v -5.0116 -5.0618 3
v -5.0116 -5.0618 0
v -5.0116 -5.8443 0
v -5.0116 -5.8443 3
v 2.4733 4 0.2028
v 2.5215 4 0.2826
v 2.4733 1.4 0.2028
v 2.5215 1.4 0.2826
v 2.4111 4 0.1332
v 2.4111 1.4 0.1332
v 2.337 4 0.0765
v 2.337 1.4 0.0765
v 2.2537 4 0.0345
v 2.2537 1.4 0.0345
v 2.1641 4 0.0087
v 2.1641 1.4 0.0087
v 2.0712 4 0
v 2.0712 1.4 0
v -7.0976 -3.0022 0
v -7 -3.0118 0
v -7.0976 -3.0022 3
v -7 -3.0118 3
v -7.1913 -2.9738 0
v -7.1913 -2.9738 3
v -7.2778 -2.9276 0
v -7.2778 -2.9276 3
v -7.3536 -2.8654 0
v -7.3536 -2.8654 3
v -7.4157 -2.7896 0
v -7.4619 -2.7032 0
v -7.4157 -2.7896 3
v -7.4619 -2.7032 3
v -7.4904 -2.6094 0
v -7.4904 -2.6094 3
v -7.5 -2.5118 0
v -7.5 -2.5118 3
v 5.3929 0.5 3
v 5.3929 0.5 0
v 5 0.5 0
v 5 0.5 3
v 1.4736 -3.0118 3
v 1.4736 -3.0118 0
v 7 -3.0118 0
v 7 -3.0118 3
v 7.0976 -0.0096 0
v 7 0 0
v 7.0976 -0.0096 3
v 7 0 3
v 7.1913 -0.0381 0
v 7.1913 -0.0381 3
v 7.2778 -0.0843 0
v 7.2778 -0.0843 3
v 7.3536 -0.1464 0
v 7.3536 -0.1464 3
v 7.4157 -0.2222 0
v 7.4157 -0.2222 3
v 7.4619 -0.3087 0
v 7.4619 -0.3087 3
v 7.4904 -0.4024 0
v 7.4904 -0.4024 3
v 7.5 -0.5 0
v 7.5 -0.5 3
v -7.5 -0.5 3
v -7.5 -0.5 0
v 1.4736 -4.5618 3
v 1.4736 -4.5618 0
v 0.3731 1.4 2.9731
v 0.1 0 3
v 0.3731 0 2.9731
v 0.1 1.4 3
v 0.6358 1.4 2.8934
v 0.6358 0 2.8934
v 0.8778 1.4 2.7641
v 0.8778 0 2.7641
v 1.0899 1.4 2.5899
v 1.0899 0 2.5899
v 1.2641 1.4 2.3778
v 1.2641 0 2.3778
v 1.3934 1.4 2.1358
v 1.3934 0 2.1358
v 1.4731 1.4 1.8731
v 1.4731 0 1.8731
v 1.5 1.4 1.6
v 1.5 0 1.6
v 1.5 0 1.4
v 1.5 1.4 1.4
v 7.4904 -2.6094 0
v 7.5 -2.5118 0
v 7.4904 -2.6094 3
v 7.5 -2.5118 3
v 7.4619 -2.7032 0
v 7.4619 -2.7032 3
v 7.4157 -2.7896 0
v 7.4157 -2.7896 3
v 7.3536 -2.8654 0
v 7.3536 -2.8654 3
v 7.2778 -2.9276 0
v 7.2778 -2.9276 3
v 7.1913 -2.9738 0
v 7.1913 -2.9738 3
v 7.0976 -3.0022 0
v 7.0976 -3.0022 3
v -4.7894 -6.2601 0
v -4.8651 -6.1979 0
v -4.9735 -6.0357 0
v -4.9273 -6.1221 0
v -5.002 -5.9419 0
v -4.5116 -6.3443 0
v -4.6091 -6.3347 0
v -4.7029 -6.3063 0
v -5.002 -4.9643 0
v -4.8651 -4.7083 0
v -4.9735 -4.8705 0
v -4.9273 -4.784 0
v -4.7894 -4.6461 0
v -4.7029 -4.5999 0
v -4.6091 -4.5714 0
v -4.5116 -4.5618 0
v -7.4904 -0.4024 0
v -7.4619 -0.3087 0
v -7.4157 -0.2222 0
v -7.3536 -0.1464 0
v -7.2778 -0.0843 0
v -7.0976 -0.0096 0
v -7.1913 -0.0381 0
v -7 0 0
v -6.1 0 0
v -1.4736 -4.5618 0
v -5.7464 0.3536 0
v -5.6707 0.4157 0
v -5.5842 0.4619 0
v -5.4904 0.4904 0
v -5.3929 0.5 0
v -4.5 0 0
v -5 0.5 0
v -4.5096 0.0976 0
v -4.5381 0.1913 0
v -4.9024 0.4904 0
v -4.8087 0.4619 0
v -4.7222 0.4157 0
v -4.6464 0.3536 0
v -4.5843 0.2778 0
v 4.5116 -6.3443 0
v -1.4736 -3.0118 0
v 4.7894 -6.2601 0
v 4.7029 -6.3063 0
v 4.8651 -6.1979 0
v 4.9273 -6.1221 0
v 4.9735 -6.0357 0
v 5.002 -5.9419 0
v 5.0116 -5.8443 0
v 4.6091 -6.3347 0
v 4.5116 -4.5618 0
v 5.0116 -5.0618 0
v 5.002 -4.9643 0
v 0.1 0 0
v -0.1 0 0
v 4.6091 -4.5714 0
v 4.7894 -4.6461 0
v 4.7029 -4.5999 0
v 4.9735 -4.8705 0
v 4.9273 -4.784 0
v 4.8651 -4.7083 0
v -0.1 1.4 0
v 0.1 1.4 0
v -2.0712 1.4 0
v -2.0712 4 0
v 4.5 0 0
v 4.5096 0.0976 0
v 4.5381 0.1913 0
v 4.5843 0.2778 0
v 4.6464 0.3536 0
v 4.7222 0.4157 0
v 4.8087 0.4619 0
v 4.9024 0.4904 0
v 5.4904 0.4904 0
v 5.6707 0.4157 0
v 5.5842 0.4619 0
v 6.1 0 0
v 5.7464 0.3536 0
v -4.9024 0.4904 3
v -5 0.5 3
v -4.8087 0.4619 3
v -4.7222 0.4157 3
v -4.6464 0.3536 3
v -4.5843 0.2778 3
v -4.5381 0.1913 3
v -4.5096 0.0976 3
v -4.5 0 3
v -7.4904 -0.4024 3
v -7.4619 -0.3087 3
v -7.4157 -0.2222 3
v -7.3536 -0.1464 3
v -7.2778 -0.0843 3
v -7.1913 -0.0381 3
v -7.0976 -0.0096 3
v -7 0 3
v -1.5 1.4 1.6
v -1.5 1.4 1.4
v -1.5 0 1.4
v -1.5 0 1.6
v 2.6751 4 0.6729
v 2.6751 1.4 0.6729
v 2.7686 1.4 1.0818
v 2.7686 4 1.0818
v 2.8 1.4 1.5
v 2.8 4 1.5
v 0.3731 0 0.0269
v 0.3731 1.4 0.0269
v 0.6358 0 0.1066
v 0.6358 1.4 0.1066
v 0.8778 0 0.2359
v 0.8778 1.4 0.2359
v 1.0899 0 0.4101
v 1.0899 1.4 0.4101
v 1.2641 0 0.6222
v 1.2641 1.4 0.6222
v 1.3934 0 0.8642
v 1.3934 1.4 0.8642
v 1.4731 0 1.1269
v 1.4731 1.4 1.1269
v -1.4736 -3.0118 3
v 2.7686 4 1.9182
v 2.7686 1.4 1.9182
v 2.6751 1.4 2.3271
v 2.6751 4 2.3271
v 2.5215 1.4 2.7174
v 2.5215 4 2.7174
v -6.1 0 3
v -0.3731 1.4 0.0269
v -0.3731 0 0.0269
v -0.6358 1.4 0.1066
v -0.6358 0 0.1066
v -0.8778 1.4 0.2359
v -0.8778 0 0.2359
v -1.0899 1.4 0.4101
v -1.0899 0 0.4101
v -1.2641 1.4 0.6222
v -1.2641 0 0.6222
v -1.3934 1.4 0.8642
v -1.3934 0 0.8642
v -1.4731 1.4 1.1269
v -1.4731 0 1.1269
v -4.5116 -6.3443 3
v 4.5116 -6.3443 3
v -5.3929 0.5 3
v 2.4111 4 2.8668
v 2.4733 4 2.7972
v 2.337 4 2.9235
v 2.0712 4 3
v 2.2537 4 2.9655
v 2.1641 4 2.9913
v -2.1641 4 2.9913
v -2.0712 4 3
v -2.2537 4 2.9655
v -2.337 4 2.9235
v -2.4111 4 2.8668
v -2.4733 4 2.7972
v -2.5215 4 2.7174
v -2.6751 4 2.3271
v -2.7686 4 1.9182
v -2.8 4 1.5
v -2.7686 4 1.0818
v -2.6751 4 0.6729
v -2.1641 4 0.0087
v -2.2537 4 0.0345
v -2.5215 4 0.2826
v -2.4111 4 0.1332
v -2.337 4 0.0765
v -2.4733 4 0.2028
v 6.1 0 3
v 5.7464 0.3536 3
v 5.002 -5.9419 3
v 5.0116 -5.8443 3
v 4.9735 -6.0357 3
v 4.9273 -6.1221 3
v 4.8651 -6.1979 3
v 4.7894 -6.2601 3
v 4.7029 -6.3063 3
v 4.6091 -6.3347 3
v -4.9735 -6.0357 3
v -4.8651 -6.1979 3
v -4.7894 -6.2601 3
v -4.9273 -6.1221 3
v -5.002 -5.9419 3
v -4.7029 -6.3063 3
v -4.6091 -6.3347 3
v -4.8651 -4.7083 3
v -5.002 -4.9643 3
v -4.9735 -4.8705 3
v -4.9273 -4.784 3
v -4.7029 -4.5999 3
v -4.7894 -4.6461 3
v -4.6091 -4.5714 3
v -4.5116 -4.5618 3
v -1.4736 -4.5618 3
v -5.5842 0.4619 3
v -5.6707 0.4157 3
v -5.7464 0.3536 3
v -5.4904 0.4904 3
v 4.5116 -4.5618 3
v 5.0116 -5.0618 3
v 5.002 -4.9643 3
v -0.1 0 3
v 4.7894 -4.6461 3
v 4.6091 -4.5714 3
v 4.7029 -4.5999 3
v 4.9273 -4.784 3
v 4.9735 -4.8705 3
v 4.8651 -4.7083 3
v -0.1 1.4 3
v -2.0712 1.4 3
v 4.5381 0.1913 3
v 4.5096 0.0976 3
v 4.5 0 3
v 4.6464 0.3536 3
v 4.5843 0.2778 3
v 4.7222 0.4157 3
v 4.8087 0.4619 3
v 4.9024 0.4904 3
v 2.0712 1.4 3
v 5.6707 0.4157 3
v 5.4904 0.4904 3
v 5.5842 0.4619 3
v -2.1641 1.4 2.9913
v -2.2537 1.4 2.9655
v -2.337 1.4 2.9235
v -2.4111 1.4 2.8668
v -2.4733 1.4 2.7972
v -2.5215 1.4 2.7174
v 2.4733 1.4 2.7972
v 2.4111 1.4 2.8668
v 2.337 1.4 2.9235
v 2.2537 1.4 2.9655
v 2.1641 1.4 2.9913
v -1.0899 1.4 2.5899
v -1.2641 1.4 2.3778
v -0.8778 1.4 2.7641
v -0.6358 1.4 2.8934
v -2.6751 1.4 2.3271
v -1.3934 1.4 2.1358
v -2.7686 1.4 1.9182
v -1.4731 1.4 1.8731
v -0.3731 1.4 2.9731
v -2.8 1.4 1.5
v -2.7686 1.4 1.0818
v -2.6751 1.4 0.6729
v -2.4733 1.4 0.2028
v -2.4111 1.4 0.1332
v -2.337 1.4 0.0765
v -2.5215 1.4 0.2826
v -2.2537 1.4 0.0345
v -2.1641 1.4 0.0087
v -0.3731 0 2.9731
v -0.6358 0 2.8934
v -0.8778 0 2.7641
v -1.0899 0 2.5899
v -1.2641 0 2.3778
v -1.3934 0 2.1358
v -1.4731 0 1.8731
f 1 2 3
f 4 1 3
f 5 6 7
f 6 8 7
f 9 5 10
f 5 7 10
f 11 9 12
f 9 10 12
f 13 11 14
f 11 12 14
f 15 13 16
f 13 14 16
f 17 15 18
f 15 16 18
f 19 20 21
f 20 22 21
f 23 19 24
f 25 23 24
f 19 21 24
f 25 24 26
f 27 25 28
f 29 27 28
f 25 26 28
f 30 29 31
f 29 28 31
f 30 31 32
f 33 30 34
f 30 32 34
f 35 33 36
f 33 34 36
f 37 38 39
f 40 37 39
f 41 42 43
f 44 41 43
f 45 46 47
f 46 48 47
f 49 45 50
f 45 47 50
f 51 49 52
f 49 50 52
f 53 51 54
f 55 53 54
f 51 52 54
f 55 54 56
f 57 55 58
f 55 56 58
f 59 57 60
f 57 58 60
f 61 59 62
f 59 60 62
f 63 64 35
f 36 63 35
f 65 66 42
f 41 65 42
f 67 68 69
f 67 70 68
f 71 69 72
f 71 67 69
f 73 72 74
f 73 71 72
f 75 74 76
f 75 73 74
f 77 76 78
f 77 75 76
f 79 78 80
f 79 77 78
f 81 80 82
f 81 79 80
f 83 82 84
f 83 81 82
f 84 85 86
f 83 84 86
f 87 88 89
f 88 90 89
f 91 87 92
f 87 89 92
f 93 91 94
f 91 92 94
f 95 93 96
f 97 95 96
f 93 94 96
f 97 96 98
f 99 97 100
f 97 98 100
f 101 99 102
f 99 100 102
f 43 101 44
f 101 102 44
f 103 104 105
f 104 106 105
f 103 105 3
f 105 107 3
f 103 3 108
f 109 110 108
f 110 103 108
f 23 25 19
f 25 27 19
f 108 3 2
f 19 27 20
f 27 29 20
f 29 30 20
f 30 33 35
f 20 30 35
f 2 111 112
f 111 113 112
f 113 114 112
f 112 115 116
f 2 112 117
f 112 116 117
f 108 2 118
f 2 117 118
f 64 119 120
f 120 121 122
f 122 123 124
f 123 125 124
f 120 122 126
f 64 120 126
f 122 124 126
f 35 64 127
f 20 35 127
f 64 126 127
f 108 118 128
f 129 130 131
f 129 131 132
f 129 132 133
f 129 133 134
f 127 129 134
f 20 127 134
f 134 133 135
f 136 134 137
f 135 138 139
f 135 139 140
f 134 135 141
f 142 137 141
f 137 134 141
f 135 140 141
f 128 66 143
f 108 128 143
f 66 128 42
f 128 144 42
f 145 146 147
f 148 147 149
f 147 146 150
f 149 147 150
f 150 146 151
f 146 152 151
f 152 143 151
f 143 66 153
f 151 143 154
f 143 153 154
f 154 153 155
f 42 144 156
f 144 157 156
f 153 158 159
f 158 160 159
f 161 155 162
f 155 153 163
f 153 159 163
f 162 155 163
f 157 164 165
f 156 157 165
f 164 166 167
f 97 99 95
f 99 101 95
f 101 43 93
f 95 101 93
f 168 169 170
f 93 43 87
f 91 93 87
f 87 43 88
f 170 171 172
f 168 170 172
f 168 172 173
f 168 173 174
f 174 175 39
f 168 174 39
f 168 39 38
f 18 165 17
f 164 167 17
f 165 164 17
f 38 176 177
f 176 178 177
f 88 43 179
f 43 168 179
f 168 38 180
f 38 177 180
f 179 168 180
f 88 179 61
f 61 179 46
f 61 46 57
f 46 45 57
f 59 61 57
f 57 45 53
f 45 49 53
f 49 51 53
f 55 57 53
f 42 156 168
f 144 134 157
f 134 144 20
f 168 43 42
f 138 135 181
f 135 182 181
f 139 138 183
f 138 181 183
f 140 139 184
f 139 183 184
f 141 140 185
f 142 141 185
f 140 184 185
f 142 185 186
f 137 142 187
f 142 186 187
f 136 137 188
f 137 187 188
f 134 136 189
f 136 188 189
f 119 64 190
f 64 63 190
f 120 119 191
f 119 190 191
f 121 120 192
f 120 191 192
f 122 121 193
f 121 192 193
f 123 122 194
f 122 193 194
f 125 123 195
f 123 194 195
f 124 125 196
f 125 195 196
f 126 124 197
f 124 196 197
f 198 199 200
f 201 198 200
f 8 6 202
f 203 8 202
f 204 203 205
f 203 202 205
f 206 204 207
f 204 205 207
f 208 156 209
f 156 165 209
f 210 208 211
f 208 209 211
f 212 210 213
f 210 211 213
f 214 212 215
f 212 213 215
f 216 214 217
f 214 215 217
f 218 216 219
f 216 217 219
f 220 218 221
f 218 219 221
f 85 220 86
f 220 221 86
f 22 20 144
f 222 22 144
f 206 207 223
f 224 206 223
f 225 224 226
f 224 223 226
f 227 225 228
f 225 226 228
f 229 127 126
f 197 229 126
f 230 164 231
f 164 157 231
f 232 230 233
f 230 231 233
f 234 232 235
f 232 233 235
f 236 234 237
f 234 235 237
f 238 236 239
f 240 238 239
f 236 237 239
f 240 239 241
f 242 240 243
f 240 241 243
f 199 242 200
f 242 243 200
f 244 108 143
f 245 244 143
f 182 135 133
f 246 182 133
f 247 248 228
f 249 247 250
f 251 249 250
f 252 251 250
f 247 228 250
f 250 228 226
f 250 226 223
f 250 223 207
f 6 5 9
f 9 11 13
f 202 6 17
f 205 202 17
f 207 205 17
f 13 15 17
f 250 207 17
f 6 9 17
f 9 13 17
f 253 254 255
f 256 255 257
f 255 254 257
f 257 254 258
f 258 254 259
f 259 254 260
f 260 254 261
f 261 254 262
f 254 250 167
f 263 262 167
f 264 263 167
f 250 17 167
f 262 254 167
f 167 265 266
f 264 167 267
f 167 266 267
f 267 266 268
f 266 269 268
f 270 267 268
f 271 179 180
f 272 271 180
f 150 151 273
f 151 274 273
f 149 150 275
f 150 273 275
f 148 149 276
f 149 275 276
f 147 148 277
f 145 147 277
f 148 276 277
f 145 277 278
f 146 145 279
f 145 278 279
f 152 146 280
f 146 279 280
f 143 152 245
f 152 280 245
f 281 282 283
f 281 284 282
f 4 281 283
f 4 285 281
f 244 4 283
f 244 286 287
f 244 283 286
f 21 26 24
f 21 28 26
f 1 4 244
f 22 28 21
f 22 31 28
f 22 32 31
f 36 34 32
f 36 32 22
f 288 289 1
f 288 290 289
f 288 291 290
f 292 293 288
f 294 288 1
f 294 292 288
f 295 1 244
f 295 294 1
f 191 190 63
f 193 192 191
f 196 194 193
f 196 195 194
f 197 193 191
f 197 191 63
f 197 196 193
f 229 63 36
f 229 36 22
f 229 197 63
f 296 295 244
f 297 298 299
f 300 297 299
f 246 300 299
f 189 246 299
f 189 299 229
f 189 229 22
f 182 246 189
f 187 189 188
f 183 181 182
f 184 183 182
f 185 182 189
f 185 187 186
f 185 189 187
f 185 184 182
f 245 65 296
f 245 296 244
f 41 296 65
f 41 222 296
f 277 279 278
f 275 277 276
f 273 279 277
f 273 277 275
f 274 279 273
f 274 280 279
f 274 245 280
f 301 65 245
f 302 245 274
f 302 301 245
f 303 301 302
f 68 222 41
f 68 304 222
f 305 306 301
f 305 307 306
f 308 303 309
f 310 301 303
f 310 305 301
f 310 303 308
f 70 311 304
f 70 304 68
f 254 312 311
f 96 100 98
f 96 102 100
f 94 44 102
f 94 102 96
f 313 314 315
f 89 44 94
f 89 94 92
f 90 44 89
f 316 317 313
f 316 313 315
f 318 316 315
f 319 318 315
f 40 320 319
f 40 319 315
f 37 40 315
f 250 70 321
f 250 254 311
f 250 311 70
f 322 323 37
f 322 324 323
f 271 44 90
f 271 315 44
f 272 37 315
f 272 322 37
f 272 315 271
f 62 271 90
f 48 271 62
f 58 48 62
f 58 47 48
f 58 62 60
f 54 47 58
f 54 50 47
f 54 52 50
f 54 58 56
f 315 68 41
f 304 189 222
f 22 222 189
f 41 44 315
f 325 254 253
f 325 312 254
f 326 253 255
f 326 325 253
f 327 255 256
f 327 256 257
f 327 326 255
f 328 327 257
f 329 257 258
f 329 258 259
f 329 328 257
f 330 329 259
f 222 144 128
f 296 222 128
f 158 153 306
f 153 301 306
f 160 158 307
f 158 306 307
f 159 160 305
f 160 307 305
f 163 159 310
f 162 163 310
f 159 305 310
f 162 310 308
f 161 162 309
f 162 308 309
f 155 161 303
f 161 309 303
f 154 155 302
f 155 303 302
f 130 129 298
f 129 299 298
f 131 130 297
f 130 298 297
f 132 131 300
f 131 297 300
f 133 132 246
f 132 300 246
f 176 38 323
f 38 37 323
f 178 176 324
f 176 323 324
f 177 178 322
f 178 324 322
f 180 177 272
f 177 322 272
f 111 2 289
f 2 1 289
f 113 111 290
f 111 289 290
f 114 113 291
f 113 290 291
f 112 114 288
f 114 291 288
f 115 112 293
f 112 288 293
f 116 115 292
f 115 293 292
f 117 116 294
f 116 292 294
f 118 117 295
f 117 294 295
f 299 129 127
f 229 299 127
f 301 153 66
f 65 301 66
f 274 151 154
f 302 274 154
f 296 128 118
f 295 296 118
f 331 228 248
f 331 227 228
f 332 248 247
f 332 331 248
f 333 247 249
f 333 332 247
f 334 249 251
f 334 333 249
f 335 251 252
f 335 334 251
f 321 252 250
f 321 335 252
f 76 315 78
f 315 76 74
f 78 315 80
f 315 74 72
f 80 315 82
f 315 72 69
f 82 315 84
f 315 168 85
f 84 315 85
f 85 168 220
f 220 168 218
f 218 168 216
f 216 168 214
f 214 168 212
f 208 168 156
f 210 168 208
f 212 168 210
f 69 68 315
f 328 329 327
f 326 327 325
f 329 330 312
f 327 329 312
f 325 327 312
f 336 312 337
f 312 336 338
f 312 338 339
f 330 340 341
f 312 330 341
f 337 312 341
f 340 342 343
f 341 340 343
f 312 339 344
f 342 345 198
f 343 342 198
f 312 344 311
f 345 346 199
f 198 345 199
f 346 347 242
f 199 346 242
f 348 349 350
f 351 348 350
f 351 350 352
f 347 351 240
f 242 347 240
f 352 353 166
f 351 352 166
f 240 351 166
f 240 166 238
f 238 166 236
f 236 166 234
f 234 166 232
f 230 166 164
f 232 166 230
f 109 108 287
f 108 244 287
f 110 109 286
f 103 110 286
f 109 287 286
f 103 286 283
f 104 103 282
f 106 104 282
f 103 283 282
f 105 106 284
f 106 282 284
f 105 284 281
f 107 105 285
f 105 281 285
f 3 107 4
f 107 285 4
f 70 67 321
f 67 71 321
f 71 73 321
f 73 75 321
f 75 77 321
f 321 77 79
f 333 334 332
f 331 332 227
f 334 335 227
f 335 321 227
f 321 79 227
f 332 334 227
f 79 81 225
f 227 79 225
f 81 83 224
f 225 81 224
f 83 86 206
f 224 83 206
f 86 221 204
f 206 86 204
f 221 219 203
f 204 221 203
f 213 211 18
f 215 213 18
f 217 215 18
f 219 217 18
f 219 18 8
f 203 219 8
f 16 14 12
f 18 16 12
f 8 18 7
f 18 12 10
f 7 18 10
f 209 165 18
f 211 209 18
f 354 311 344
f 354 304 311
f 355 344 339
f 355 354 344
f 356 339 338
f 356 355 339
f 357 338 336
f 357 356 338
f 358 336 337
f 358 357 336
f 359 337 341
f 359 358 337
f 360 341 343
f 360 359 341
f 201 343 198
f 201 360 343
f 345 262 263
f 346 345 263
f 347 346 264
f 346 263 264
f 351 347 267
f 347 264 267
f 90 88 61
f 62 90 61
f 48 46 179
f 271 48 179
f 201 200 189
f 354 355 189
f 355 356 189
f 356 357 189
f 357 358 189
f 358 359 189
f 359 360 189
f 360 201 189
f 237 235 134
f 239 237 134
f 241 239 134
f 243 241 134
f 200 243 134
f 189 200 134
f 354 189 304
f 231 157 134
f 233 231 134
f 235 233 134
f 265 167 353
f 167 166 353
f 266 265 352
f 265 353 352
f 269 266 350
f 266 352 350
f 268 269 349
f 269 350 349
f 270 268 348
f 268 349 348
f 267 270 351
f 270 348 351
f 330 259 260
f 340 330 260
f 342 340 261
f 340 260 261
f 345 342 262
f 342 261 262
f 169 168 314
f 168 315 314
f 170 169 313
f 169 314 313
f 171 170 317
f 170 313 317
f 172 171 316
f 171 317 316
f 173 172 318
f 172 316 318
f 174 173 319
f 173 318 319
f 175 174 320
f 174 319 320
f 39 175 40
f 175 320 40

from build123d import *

# Parameters (mm, degrees)
F2_DEPTH = 3
F4_DEPTH = 2.6
F5_R     = 0.49999
F6_R     = 1.4


# Not quite as in the source:
# - a fillet or chamfer is up to 0.001 mm smaller than in the source, because OpenCascade refuses the exact size


with BuildPart() as f2:
    # F1 (on Top) → F2 (new body)
    with BuildSketch(Plane.XY):
        Polygon((2.8, 1.4), (2.8, 4), (-2.8, 4), (-2.8, 1.4), (-1.5, 1.4), (-1.5, 0), (-4.5, 0), (-4.5, 0.5), (-5.6, 0.5), (-6.1, 0), (-7.5, 0), (-7.5, -3.0118150752), (-1.4735722734, -3.0118150752), (-1.4735722734, -4.5618148234), (-5.01158851, -4.5618148234), (-5.01158851, -6.3443139292), (5.01158851, -6.3443139292), (5.01158851, -4.5618148234), (1.4735722734, -4.5618148234), (1.4735722734, -3.0118150752), (7.5, -3.0118150752), (7.5, 0), (6.1, 0), (5.6, 0.5), (4.5, 0.5), (4.5, 0), (1.5, 0), (1.5, 1.4), align=None)
    extrude(amount=F2_DEPTH)

    # F3 (on face) → F4 (cut, through all)
    with BuildSketch(Plane(origin=(0, 4, 0), x_dir=(-1, 0, 0), z_dir=(0, 1, 0))):
        with BuildLine():
            Line((2.8, 0), (2.8, 1.5))
            ThreePointArc((2.8, 1.5), (2.6888743587, 0.7190040441), (2.3643180835, 0))
            Line((2.3643180835, 0), (2.8, 0))
        make_face()
        with BuildLine():
            ThreePointArc((2.3643180835, 3), (2.6888743587, 2.2809959559), (2.8, 1.5))
            Line((2.8, 1.5), (2.8, 3))
            Line((2.8, 3), (2.3643180835, 3))
        make_face()
        with BuildLine():
            ThreePointArc((-2.3643180835, 0), (0, -1.3), (2.3643180835, 0))
            Line((2.3643180835, 0), (-2.3643180835, 0))
        make_face()
        with BuildLine():
            ThreePointArc((-2.8, 1.5), (-2.6888743587, 2.2809959559), (-2.3643180835, 3))
            Line((-2.3643180835, 3), (-2.8, 3))
            Line((-2.8, 3), (-2.8, 1.5))
        make_face()
        with BuildLine():
            Line((-2.8, 0), (-2.3643180835, 0))
            ThreePointArc((-2.3643180835, 0), (-2.6888743587, 0.7190040441), (-2.8, 1.5))
            Line((-2.8, 1.5), (-2.8, 0))
        make_face()
    extrude(amount=-F4_DEPTH, mode=Mode.SUBTRACT)

    # F5 (radius 0.5 in the source; OpenCascade refuses exactly that, so slightly less here)
    f5_edges = [f2.edges().sort_by_distance(p)[0] for p in [
        (4.5, 0.5, 1.5),
        (5.6, 0.5, 1.5),
        (7.5, 0, 1.5),
        (7.5, -3.011815, 1.5),
        (5.011589, -4.561815, 1.5),
        (5.011589, -6.344314, 1.5),
        (-4.5, 0.5, 1.5),
        (-5.6, 0.5, 1.5),
        (-7.5, 0, 1.5),
        (-7.5, -3.011815, 1.5),
        (-5.011589, -6.344314, 1.5),
        (-5.011589, -4.561815, 1.5),
        (2.364318, 2.7, 3),
        (-2.364318, 2.7, 3),
        (2.364318, 2.7, 0),
        (-2.364318, 2.7, 0),
    ]]
    fillet(f5_edges, radius=F5_R)

    # F6
    f6_edges = [f2.edges().sort_by_distance(p)[0] for p in [
        (1.5, 0.7, 3),
        (-1.5, 0.7, 3),
        (1.5, 0.7, 0),
        (-1.5, 0.7, 0),
    ]]
    fillet(f6_edges, radius=F6_R)


solid = f2.part
